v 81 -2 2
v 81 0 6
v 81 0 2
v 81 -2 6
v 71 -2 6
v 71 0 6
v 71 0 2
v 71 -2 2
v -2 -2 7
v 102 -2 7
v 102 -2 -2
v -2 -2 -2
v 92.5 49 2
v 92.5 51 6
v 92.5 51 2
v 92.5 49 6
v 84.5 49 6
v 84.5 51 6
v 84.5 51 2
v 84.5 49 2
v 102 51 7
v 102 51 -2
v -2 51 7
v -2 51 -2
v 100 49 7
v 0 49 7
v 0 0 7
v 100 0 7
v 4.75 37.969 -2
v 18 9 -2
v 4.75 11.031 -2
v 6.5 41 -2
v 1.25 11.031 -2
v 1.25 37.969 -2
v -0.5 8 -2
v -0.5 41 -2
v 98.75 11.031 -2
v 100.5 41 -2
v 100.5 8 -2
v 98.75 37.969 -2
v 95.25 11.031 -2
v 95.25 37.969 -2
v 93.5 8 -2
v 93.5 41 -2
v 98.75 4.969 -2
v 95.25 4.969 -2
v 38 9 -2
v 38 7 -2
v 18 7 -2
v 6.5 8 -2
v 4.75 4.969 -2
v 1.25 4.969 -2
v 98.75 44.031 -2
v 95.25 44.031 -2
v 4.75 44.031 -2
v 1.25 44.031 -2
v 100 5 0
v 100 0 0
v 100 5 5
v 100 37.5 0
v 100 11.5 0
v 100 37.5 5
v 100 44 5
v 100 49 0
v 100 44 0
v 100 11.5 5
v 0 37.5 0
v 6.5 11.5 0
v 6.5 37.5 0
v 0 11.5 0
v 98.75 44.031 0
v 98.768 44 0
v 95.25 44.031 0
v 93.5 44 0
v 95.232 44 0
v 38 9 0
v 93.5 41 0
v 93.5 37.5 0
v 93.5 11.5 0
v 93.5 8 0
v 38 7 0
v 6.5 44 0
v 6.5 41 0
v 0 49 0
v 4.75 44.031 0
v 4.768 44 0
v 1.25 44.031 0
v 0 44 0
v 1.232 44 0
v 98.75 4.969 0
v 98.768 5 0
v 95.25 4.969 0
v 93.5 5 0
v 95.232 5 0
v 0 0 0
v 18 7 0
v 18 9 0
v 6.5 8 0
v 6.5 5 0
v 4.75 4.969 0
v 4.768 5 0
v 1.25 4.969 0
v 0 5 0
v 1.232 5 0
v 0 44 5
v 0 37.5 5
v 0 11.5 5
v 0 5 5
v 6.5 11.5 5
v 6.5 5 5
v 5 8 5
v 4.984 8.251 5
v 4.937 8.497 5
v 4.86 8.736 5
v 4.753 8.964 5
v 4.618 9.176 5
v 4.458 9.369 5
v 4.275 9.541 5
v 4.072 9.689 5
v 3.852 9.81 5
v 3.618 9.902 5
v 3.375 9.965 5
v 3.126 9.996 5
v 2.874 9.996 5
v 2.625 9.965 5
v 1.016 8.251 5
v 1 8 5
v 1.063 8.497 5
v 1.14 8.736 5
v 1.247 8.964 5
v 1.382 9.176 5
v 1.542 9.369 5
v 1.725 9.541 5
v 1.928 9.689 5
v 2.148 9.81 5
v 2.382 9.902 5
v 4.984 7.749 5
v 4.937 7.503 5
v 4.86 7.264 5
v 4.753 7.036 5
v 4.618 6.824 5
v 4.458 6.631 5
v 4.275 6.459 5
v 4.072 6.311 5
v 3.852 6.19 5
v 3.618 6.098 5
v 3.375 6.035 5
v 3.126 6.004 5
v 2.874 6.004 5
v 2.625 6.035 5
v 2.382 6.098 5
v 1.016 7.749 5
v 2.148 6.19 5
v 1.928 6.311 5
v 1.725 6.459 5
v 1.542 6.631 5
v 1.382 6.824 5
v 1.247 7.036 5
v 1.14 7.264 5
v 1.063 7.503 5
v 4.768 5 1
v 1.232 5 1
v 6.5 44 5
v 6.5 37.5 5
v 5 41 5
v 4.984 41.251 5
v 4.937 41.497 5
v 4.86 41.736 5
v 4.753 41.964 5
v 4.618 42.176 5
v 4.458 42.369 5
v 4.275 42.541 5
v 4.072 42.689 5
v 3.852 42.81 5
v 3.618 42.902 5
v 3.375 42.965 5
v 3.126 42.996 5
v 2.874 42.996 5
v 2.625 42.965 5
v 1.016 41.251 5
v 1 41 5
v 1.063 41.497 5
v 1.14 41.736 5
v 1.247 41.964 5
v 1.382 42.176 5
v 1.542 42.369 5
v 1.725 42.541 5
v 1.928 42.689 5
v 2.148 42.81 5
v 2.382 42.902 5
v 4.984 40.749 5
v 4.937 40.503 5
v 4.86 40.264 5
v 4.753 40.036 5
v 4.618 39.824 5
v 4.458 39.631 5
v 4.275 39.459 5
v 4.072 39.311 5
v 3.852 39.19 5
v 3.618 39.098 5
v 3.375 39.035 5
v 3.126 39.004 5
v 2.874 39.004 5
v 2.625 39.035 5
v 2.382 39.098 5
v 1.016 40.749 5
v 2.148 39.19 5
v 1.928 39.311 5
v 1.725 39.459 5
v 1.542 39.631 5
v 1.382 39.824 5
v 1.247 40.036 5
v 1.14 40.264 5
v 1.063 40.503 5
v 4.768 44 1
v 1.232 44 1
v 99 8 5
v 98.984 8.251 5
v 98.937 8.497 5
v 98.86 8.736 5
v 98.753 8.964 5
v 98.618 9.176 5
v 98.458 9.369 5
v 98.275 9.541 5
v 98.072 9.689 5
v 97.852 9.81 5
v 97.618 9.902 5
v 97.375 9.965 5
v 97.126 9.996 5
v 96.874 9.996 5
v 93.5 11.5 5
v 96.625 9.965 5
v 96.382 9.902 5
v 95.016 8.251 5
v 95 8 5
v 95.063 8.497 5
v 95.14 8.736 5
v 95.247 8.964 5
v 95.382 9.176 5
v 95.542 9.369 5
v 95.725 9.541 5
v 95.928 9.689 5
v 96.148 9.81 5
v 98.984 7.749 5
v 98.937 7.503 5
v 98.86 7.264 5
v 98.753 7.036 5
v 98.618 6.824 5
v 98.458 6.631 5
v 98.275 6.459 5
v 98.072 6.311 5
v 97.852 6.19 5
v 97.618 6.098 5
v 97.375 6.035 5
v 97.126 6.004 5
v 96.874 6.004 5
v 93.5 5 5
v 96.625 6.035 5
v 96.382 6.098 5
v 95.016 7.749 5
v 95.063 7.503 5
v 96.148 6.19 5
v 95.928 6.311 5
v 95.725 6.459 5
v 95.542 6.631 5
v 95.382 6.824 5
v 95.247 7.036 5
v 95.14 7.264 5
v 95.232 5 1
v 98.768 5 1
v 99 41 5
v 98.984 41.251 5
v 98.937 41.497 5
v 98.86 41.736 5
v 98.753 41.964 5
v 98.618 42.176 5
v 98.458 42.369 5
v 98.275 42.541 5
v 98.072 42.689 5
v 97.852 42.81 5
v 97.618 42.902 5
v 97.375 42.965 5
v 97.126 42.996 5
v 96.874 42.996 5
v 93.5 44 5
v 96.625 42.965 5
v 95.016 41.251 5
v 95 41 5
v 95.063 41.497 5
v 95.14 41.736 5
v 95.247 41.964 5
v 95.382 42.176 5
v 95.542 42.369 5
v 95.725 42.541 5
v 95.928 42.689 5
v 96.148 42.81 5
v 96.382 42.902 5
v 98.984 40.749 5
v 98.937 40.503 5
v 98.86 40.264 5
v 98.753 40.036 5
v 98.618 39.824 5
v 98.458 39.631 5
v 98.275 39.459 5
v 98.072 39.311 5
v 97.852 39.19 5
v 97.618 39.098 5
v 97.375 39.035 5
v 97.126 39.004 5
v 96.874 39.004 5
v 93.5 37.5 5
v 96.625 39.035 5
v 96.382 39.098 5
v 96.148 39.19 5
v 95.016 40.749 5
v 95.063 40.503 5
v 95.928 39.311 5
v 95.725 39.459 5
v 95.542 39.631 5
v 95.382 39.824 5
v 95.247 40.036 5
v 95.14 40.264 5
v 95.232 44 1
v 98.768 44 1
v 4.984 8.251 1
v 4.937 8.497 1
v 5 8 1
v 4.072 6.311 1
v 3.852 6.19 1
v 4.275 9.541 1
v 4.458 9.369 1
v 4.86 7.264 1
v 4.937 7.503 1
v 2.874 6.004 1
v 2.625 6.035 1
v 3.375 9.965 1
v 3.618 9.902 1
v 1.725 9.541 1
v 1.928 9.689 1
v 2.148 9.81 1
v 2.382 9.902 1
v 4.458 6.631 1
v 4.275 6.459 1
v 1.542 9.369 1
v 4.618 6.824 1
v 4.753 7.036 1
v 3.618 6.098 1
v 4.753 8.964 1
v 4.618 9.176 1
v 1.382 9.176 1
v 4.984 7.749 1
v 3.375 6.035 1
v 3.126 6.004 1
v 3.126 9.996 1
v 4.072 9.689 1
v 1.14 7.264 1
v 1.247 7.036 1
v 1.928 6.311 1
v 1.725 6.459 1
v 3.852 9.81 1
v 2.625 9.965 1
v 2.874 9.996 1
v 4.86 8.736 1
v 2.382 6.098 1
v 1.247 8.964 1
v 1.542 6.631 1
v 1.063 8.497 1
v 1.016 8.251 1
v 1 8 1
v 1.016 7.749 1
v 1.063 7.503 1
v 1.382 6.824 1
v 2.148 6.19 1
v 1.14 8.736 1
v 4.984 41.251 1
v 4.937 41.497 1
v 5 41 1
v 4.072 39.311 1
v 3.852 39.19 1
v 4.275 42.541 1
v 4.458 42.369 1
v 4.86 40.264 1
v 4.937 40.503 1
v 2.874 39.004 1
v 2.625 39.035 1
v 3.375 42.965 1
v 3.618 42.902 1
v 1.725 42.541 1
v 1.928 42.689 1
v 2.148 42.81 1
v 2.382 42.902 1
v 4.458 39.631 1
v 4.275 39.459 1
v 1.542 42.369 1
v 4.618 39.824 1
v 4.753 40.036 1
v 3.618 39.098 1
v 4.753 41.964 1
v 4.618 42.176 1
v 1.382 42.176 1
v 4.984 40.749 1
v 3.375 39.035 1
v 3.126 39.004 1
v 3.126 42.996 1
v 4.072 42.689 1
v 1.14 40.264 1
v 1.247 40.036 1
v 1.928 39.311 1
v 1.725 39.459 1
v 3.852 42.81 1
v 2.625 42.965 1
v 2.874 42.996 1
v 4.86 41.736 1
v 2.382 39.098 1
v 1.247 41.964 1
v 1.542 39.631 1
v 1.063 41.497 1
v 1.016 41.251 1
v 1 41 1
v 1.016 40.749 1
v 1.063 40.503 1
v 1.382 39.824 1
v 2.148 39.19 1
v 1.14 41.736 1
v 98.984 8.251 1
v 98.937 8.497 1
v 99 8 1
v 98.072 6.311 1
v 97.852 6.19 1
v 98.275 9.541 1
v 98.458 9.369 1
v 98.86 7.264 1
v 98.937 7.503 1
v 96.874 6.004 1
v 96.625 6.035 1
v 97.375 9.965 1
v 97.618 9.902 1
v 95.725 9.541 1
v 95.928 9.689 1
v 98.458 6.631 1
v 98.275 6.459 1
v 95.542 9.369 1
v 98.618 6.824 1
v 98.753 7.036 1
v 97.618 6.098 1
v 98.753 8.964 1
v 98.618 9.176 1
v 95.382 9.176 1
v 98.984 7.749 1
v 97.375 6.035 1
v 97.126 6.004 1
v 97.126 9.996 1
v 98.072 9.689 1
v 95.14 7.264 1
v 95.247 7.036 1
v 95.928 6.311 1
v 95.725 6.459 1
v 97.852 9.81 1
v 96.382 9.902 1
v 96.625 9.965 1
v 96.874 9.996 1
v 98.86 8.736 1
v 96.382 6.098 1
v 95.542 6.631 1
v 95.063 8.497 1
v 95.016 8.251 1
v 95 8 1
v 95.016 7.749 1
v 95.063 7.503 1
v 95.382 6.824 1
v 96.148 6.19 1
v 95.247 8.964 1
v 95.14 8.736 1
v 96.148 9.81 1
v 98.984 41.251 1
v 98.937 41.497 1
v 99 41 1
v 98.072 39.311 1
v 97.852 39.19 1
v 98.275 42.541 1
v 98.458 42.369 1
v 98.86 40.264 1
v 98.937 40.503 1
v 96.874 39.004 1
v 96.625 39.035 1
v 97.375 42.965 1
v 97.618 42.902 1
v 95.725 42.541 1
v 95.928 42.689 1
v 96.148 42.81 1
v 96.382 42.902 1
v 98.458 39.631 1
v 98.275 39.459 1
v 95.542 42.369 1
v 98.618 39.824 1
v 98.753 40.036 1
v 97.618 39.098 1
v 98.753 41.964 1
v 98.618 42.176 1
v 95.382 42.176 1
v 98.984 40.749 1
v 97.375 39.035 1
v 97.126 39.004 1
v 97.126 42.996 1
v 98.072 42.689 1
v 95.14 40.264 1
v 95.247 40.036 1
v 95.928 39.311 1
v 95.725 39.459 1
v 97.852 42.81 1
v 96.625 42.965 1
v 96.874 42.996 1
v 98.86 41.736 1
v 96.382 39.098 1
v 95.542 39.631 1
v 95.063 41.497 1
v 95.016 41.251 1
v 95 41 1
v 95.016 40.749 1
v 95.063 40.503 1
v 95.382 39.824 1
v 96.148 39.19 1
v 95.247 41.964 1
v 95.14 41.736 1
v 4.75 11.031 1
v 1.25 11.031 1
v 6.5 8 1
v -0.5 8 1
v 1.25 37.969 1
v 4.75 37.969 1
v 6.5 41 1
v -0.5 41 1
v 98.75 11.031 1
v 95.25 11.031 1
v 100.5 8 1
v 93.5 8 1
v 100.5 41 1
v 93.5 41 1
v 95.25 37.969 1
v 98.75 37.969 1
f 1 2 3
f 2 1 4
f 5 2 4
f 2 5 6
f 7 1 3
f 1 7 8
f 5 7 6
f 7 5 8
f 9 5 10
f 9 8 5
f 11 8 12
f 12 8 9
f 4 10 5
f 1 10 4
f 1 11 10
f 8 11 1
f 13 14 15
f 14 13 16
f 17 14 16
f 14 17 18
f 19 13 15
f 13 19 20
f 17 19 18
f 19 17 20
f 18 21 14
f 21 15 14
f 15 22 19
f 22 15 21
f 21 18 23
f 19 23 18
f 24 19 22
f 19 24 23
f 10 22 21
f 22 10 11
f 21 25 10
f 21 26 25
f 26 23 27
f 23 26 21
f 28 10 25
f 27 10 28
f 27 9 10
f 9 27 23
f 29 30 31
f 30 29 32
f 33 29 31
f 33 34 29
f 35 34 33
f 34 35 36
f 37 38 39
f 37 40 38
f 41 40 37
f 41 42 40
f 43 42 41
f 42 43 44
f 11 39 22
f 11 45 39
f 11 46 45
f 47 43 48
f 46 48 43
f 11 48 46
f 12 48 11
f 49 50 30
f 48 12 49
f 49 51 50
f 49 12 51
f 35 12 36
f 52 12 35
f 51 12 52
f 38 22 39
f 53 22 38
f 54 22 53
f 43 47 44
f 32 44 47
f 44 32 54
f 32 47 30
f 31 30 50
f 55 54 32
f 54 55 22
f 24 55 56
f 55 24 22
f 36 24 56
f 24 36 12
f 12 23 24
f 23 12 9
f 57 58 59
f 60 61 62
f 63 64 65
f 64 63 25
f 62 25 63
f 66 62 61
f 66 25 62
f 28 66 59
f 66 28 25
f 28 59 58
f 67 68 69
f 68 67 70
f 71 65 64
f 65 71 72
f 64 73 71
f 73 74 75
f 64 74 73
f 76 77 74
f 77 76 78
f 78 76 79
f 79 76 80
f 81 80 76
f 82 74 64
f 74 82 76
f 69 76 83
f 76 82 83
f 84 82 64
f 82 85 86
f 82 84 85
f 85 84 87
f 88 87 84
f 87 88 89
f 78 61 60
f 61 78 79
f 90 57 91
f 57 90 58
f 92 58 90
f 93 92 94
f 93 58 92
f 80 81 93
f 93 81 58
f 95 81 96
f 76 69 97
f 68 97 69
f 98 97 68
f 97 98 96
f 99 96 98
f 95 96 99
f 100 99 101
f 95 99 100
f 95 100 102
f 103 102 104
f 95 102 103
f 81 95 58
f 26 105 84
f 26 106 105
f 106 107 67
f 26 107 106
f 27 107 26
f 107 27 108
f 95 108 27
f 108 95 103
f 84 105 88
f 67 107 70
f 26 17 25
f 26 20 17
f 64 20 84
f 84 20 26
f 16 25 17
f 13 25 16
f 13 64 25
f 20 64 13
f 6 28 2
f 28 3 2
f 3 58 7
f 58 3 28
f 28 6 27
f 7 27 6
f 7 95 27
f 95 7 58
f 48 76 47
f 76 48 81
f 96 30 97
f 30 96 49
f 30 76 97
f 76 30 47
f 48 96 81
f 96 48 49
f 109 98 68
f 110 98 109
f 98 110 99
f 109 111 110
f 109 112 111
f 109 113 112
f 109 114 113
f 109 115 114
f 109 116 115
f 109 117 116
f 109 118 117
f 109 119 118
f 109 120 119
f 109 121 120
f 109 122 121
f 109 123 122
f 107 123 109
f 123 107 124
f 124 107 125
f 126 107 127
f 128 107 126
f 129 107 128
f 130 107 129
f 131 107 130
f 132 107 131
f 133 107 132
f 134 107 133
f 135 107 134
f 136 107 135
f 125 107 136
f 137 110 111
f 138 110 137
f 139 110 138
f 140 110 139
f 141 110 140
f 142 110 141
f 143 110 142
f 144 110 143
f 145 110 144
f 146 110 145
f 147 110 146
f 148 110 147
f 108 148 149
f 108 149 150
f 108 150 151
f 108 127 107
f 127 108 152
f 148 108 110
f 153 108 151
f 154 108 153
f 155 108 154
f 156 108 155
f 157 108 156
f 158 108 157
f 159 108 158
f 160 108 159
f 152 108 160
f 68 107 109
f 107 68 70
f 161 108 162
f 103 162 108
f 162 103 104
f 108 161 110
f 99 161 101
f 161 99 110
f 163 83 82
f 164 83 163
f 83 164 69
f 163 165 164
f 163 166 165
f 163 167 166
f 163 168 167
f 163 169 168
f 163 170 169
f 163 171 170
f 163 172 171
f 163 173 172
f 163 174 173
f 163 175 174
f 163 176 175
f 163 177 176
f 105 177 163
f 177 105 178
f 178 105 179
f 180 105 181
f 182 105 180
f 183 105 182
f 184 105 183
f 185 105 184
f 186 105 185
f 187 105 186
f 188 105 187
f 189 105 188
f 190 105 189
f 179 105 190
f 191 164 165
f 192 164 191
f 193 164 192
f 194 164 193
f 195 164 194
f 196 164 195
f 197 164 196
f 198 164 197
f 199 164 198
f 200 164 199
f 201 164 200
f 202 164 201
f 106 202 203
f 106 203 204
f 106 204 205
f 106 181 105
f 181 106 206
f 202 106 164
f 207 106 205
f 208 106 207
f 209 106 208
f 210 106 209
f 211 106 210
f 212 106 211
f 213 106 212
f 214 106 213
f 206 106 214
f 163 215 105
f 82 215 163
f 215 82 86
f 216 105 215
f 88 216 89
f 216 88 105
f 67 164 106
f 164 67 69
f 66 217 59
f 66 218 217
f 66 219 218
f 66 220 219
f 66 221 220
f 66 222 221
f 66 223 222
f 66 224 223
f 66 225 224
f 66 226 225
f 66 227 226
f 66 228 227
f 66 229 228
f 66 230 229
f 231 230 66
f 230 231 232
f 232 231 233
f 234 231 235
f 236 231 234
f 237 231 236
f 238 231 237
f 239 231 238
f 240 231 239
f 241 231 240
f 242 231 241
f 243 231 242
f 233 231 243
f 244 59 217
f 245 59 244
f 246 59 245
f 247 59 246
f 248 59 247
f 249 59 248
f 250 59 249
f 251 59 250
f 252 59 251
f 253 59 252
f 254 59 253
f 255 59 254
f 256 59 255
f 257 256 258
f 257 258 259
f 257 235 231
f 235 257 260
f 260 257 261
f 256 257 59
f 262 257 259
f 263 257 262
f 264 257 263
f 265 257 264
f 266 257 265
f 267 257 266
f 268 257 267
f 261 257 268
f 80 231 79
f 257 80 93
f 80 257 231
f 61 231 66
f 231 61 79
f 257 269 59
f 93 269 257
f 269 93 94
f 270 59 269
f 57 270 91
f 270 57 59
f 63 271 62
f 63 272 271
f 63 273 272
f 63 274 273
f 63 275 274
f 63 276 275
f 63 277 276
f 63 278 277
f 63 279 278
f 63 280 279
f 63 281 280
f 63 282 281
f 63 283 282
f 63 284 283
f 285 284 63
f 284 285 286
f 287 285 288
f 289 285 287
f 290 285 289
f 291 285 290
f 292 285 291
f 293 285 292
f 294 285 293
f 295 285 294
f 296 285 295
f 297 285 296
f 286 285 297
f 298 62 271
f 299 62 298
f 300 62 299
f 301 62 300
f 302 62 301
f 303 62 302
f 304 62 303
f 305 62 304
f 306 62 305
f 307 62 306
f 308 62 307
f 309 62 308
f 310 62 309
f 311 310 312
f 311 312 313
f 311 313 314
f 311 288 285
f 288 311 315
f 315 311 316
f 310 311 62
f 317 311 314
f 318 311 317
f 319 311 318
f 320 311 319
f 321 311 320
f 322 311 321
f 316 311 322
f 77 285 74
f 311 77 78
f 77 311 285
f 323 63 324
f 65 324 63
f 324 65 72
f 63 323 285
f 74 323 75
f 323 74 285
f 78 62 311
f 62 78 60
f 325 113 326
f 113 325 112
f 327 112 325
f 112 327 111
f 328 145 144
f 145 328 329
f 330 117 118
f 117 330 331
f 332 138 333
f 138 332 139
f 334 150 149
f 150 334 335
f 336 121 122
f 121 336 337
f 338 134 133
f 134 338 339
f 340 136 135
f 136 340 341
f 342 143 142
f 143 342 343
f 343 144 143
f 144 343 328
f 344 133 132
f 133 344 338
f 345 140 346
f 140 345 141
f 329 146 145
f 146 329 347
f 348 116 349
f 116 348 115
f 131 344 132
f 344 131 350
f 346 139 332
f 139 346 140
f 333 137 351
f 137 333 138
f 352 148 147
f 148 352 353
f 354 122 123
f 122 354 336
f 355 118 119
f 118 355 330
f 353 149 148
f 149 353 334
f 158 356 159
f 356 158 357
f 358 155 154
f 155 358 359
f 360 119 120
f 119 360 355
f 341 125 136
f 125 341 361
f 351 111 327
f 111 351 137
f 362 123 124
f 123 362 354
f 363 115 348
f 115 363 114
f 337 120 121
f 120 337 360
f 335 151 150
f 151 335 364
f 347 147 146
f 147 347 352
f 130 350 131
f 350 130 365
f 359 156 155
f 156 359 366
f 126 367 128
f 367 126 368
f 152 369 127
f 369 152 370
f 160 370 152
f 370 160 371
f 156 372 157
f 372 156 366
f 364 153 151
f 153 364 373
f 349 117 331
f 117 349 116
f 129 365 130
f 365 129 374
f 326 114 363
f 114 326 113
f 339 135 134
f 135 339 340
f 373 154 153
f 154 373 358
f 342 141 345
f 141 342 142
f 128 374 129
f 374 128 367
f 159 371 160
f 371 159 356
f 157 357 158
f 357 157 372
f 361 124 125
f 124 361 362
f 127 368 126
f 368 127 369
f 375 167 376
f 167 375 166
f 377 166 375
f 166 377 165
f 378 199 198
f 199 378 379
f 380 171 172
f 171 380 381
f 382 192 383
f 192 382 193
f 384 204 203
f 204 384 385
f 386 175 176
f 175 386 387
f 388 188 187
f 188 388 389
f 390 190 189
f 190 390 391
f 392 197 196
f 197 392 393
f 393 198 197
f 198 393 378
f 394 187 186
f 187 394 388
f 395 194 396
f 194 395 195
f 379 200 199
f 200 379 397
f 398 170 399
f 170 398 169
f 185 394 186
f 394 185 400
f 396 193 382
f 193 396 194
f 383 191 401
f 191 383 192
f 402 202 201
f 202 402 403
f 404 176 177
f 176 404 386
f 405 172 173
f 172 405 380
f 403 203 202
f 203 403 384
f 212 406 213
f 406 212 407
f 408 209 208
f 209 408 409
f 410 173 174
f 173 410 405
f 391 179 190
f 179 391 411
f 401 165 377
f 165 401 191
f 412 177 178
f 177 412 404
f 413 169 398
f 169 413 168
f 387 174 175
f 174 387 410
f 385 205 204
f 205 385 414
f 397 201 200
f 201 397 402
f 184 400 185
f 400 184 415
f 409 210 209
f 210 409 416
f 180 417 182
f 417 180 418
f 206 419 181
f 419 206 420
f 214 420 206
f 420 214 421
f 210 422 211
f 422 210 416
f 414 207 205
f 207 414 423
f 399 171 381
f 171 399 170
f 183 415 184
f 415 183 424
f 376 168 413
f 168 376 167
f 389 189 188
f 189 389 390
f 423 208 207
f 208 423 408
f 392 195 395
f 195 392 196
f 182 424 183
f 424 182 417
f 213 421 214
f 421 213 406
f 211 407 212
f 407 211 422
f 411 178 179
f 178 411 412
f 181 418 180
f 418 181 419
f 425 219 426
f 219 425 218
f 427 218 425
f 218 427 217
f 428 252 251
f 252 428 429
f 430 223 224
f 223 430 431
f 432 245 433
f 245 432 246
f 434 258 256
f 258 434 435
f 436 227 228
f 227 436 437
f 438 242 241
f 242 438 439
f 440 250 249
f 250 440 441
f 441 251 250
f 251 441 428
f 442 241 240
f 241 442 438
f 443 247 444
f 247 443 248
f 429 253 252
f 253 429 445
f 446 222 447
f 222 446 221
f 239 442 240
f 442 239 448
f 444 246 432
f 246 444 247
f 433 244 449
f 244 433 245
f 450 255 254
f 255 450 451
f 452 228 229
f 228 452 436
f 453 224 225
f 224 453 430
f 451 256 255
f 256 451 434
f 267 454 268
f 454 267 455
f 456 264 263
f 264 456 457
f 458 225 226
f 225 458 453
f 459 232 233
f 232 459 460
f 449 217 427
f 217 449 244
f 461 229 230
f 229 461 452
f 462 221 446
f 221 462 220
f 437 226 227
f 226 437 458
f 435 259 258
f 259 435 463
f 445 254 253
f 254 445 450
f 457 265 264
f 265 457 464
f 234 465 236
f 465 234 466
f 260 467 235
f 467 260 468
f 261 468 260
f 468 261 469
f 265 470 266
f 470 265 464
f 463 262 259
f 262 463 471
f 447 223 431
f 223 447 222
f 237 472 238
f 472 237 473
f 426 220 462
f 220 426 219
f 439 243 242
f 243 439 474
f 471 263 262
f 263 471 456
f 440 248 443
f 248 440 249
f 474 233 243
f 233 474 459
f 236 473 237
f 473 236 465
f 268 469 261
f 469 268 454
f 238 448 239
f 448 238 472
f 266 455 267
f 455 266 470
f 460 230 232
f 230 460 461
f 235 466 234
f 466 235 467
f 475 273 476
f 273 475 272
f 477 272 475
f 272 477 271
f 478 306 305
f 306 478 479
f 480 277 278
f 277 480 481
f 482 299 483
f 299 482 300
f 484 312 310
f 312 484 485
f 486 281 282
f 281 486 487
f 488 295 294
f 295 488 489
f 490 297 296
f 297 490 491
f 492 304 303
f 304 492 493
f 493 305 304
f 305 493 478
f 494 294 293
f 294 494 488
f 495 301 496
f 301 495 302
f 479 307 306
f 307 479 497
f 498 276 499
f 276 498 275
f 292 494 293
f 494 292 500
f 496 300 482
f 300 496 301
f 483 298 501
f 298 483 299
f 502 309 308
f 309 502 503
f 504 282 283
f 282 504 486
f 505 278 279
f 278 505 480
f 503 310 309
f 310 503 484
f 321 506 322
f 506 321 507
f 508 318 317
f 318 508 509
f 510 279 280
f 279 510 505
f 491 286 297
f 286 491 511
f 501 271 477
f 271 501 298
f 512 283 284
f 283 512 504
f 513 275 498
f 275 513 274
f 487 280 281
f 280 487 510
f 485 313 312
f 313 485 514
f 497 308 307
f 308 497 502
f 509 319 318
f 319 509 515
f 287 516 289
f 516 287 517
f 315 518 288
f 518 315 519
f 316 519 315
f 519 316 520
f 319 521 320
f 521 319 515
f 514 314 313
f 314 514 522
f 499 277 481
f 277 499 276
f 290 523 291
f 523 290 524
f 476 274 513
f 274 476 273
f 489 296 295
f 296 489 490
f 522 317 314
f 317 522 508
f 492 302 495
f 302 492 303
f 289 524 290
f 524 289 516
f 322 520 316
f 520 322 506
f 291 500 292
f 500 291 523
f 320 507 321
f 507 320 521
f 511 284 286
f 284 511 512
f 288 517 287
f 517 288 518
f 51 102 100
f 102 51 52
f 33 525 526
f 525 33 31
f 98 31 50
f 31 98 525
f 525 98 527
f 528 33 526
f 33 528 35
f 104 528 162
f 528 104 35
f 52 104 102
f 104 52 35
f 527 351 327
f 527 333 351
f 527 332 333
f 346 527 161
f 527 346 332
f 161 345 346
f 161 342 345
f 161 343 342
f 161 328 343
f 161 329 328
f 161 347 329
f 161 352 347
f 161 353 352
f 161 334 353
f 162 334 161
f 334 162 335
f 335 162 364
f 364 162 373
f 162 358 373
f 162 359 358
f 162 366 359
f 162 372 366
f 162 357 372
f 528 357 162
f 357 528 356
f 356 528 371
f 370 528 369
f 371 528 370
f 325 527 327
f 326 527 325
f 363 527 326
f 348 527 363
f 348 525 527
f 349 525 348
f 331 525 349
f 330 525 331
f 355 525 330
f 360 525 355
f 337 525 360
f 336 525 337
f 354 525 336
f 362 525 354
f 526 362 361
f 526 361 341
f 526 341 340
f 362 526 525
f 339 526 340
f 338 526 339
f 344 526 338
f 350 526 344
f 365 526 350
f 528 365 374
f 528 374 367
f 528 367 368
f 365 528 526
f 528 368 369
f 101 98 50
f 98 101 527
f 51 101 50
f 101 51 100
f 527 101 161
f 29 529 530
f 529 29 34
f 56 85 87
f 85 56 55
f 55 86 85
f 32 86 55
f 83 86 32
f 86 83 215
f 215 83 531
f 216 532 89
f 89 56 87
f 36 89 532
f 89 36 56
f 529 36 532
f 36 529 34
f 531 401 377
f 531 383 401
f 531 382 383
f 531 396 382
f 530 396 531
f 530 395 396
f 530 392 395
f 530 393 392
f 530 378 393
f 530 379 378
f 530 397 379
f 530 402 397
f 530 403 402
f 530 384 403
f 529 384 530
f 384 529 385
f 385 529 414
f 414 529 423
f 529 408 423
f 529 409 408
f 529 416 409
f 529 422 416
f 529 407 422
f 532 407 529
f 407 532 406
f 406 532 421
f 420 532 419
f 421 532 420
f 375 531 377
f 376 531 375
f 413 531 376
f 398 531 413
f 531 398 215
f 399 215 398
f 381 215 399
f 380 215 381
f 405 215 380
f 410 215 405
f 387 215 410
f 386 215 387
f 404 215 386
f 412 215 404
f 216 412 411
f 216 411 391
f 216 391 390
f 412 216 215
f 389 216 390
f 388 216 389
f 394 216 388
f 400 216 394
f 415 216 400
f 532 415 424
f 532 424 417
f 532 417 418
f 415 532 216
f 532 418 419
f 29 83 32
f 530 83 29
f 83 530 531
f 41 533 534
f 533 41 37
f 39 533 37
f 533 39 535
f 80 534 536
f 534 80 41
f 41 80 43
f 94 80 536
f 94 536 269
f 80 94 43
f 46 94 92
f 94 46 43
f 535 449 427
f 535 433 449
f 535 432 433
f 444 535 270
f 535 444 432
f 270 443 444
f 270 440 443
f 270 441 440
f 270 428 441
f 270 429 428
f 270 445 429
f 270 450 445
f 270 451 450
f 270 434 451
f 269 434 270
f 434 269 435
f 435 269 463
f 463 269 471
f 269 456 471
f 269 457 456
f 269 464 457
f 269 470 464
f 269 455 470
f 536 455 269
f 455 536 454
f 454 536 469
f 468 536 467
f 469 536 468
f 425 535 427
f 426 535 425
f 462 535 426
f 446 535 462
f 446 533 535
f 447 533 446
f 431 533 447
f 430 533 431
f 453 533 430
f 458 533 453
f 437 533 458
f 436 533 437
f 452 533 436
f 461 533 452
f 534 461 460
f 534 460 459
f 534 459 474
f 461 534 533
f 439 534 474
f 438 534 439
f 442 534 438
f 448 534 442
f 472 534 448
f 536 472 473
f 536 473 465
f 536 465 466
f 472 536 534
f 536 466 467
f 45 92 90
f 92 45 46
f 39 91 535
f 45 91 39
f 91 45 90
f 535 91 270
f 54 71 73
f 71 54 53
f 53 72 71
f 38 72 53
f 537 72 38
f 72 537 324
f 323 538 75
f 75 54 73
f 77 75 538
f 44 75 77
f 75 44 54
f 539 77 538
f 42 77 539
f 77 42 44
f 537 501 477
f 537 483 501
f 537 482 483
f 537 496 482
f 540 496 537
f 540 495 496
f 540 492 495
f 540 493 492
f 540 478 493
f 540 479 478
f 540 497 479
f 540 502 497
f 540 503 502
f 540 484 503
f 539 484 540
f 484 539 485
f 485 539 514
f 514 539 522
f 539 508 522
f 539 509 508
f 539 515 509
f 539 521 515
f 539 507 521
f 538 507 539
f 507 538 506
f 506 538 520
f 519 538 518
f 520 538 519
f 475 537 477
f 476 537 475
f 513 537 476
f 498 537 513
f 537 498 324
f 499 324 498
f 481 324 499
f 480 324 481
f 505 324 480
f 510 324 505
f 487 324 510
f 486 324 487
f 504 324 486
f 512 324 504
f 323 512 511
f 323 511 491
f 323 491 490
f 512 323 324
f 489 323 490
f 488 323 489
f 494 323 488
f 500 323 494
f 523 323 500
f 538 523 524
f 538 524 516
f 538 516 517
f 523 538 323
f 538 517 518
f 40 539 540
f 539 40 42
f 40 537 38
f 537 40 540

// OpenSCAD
/*
Case for: Wemos Powerbank V3, V8 and V9 Design: 2020

==================================================================================
==================================================================================
Copyright (c) Manuel Strauch (hoschi@anukis.de)
The Regents of the University of California. All rights reserved.

Redistribution and use in source and binary forms, with or without modification, 
are permitted provided that the following conditions are met:
Redistributions of source code must retain the above copyright notice, 
this list of conditions and the following disclaimer.
Redistributions in binary form must reproduce the above copyright notice, 
this list of conditions and the following disclaimer in the documentation 
and/orother materials provided with the distribution.
All advertising materials mentioning features or use of this software 
must display the following acknowledgement: "This product includes 
software developed by the University of California, Berkeley and its contributors."
Neither the name of the University nor the names of its contributors may be used 
to endorse or promote products derived from this software without 
specific prior written permission.
THIS SOFTWARE IS PROVIDED BY THE REGENTS AND CONTRIBUTORS "AS IS" AND 
ANY EXPRESS OR IMPLIED WARRANTIES, INCLUDING, BUT NOT LIMITED TO, 
THE IMPLIED WARRANTIES OF MERCHANTABILITY AND FITNESS FOR A PARTICULAR PURPOSE 
ARE DISCLAIMED. IN NO EVENT SHALL THE REGENTS OR CONTRIBUTORS BE LIABLE FOR 
ANY DIRECT, INDIRECT, INCIDENTAL, SPECIAL, EXEMPLARY, OR CONSEQUENTIAL DAMAGES 
(INCLUDING, BUT NOT LIMITED TO, PROCUREMENT OF SUBSTITUTE GOODS OR SERVICES; 
LOSS OF USE, DATA, OR PROFITS; OR BUSINESS INTERRUPTION) HOWEVER CAUSED AND 
ON ANY THEORY OF LIABILITY, WHETHER IN CONTRACT, STRICT LIABILITY, OR TORT 
(INCLUDING NEGLIGENCE OR OTHERWISE) ARISING IN ANY WAY OUT OF THE USE OF THIS 
SOFTWARE, EVEN IF ADVISED OF THE POSSIBILITY OF SUCH DAMAGE.

================================================================================
================================================================================
*/
// Which one , would you build: v3, v8 or v9
type="v8";

/*
================================================================================
================================================================================
*/


if (type=="v3"){
  //V3
  bottomcase(length=100,width=30,holelength=2,holewidth=2.5);
}

if (type=="v8"){
  //V8
  bottomcase(length=100,width=49,holelength=3,holewidth=8);
}

if (type=="v9"){
  //V8
  bottomcase(length=100,width=97,holelength=3,holewidth=8);
}


module bottomcase(length,width,holelength,holewidth){
    $fn=50;
    difference() {
        union() {
            difference() {
                translate([-2,-2,-2]) cube([length+4,width+4,9]);
                cube([length,width,10]);
                //V3
                if(width == 30) {
                  //LEDs
                  translate([18,5,-2])cube([20,2,3]);
                }
                //V8
                if (width == 49) {
                  //LEDs
                  translate([18,7,-2])cube([20,2,3]);
                }
                //V9
                if (width == 97) {
                  //LEDs
                  translate([22,30,-2])cube([20,2,3]);
                }
                //USB-Ports
                if(width == 30) {
                  // V3
                  translate([length-28.5,-2,2])cube([10,5,4]);
                  translate([length-14,width-2,2])cube([8,4,4]);
                }
                if(width == 49) {
                  // V8
                  translate([71,-2,2])cube([10,5,4]);
                  translate([84.5,width-2,2])cube([8,4,4]);
                }
                if (width == 97) {
                 // V9
                  translate([length-2,22,2])cube([5,10,4]);
                  translate([length-2,65.5,2])cube([4,8,4]);  
                }
            }
            //Schraubenhalterung
            if(width != 30) {
              // V8 + V9
              translate([0,5,0]) cube([6.5,6.5,5]);
              translate([0,width-6.5-5,0]) cube([6.5,6.5,5]);
              translate([length-6.5,5,0]) cube([6.5,6.5,5]);
              translate([length-6.5,width-6.5-5,0]) cube([6.5,6.5,5]);
            } else {
              // V3
              cube([6.5,6.5,5]);
              translate([0,width-6.5,0]) cube([6.5,6.5,5]);
              translate([length-5.5,0,0]) cube([6.5,6.5,5]);
              translate([length-5.5,width-6.5,0]) cube([6.5,6.5,5]);
            }
        }
        //Schraubenlöcher
        translate([holelength,holewidth,0]) cylinder(6,4/2,4/2);
        translate([holelength,width-holewidth,0]) cylinder(6,4/2,4/2);
        
        translate([length-holelength,holewidth,0]) cylinder(6,4/2,4/2);
        translate([length-holelength,width-holewidth,0]) cylinder(6,4/2,4/2);
        //Mutterneinsatz
        translate([holelength,holewidth,-2]) cylinder(3,7/2,7/2,$fn=6);
        translate([holelength,width-holewidth,-2]) cylinder(3,7/2,7/2,$fn=6);
        
        translate([length-holelength,holewidth,-2]) cylinder(3,7/2,7/2,$fn=6);
        translate([length-holelength,width-holewidth,-2]) cylinder(3,7/2,7/2,$fn=6);
    }
}
